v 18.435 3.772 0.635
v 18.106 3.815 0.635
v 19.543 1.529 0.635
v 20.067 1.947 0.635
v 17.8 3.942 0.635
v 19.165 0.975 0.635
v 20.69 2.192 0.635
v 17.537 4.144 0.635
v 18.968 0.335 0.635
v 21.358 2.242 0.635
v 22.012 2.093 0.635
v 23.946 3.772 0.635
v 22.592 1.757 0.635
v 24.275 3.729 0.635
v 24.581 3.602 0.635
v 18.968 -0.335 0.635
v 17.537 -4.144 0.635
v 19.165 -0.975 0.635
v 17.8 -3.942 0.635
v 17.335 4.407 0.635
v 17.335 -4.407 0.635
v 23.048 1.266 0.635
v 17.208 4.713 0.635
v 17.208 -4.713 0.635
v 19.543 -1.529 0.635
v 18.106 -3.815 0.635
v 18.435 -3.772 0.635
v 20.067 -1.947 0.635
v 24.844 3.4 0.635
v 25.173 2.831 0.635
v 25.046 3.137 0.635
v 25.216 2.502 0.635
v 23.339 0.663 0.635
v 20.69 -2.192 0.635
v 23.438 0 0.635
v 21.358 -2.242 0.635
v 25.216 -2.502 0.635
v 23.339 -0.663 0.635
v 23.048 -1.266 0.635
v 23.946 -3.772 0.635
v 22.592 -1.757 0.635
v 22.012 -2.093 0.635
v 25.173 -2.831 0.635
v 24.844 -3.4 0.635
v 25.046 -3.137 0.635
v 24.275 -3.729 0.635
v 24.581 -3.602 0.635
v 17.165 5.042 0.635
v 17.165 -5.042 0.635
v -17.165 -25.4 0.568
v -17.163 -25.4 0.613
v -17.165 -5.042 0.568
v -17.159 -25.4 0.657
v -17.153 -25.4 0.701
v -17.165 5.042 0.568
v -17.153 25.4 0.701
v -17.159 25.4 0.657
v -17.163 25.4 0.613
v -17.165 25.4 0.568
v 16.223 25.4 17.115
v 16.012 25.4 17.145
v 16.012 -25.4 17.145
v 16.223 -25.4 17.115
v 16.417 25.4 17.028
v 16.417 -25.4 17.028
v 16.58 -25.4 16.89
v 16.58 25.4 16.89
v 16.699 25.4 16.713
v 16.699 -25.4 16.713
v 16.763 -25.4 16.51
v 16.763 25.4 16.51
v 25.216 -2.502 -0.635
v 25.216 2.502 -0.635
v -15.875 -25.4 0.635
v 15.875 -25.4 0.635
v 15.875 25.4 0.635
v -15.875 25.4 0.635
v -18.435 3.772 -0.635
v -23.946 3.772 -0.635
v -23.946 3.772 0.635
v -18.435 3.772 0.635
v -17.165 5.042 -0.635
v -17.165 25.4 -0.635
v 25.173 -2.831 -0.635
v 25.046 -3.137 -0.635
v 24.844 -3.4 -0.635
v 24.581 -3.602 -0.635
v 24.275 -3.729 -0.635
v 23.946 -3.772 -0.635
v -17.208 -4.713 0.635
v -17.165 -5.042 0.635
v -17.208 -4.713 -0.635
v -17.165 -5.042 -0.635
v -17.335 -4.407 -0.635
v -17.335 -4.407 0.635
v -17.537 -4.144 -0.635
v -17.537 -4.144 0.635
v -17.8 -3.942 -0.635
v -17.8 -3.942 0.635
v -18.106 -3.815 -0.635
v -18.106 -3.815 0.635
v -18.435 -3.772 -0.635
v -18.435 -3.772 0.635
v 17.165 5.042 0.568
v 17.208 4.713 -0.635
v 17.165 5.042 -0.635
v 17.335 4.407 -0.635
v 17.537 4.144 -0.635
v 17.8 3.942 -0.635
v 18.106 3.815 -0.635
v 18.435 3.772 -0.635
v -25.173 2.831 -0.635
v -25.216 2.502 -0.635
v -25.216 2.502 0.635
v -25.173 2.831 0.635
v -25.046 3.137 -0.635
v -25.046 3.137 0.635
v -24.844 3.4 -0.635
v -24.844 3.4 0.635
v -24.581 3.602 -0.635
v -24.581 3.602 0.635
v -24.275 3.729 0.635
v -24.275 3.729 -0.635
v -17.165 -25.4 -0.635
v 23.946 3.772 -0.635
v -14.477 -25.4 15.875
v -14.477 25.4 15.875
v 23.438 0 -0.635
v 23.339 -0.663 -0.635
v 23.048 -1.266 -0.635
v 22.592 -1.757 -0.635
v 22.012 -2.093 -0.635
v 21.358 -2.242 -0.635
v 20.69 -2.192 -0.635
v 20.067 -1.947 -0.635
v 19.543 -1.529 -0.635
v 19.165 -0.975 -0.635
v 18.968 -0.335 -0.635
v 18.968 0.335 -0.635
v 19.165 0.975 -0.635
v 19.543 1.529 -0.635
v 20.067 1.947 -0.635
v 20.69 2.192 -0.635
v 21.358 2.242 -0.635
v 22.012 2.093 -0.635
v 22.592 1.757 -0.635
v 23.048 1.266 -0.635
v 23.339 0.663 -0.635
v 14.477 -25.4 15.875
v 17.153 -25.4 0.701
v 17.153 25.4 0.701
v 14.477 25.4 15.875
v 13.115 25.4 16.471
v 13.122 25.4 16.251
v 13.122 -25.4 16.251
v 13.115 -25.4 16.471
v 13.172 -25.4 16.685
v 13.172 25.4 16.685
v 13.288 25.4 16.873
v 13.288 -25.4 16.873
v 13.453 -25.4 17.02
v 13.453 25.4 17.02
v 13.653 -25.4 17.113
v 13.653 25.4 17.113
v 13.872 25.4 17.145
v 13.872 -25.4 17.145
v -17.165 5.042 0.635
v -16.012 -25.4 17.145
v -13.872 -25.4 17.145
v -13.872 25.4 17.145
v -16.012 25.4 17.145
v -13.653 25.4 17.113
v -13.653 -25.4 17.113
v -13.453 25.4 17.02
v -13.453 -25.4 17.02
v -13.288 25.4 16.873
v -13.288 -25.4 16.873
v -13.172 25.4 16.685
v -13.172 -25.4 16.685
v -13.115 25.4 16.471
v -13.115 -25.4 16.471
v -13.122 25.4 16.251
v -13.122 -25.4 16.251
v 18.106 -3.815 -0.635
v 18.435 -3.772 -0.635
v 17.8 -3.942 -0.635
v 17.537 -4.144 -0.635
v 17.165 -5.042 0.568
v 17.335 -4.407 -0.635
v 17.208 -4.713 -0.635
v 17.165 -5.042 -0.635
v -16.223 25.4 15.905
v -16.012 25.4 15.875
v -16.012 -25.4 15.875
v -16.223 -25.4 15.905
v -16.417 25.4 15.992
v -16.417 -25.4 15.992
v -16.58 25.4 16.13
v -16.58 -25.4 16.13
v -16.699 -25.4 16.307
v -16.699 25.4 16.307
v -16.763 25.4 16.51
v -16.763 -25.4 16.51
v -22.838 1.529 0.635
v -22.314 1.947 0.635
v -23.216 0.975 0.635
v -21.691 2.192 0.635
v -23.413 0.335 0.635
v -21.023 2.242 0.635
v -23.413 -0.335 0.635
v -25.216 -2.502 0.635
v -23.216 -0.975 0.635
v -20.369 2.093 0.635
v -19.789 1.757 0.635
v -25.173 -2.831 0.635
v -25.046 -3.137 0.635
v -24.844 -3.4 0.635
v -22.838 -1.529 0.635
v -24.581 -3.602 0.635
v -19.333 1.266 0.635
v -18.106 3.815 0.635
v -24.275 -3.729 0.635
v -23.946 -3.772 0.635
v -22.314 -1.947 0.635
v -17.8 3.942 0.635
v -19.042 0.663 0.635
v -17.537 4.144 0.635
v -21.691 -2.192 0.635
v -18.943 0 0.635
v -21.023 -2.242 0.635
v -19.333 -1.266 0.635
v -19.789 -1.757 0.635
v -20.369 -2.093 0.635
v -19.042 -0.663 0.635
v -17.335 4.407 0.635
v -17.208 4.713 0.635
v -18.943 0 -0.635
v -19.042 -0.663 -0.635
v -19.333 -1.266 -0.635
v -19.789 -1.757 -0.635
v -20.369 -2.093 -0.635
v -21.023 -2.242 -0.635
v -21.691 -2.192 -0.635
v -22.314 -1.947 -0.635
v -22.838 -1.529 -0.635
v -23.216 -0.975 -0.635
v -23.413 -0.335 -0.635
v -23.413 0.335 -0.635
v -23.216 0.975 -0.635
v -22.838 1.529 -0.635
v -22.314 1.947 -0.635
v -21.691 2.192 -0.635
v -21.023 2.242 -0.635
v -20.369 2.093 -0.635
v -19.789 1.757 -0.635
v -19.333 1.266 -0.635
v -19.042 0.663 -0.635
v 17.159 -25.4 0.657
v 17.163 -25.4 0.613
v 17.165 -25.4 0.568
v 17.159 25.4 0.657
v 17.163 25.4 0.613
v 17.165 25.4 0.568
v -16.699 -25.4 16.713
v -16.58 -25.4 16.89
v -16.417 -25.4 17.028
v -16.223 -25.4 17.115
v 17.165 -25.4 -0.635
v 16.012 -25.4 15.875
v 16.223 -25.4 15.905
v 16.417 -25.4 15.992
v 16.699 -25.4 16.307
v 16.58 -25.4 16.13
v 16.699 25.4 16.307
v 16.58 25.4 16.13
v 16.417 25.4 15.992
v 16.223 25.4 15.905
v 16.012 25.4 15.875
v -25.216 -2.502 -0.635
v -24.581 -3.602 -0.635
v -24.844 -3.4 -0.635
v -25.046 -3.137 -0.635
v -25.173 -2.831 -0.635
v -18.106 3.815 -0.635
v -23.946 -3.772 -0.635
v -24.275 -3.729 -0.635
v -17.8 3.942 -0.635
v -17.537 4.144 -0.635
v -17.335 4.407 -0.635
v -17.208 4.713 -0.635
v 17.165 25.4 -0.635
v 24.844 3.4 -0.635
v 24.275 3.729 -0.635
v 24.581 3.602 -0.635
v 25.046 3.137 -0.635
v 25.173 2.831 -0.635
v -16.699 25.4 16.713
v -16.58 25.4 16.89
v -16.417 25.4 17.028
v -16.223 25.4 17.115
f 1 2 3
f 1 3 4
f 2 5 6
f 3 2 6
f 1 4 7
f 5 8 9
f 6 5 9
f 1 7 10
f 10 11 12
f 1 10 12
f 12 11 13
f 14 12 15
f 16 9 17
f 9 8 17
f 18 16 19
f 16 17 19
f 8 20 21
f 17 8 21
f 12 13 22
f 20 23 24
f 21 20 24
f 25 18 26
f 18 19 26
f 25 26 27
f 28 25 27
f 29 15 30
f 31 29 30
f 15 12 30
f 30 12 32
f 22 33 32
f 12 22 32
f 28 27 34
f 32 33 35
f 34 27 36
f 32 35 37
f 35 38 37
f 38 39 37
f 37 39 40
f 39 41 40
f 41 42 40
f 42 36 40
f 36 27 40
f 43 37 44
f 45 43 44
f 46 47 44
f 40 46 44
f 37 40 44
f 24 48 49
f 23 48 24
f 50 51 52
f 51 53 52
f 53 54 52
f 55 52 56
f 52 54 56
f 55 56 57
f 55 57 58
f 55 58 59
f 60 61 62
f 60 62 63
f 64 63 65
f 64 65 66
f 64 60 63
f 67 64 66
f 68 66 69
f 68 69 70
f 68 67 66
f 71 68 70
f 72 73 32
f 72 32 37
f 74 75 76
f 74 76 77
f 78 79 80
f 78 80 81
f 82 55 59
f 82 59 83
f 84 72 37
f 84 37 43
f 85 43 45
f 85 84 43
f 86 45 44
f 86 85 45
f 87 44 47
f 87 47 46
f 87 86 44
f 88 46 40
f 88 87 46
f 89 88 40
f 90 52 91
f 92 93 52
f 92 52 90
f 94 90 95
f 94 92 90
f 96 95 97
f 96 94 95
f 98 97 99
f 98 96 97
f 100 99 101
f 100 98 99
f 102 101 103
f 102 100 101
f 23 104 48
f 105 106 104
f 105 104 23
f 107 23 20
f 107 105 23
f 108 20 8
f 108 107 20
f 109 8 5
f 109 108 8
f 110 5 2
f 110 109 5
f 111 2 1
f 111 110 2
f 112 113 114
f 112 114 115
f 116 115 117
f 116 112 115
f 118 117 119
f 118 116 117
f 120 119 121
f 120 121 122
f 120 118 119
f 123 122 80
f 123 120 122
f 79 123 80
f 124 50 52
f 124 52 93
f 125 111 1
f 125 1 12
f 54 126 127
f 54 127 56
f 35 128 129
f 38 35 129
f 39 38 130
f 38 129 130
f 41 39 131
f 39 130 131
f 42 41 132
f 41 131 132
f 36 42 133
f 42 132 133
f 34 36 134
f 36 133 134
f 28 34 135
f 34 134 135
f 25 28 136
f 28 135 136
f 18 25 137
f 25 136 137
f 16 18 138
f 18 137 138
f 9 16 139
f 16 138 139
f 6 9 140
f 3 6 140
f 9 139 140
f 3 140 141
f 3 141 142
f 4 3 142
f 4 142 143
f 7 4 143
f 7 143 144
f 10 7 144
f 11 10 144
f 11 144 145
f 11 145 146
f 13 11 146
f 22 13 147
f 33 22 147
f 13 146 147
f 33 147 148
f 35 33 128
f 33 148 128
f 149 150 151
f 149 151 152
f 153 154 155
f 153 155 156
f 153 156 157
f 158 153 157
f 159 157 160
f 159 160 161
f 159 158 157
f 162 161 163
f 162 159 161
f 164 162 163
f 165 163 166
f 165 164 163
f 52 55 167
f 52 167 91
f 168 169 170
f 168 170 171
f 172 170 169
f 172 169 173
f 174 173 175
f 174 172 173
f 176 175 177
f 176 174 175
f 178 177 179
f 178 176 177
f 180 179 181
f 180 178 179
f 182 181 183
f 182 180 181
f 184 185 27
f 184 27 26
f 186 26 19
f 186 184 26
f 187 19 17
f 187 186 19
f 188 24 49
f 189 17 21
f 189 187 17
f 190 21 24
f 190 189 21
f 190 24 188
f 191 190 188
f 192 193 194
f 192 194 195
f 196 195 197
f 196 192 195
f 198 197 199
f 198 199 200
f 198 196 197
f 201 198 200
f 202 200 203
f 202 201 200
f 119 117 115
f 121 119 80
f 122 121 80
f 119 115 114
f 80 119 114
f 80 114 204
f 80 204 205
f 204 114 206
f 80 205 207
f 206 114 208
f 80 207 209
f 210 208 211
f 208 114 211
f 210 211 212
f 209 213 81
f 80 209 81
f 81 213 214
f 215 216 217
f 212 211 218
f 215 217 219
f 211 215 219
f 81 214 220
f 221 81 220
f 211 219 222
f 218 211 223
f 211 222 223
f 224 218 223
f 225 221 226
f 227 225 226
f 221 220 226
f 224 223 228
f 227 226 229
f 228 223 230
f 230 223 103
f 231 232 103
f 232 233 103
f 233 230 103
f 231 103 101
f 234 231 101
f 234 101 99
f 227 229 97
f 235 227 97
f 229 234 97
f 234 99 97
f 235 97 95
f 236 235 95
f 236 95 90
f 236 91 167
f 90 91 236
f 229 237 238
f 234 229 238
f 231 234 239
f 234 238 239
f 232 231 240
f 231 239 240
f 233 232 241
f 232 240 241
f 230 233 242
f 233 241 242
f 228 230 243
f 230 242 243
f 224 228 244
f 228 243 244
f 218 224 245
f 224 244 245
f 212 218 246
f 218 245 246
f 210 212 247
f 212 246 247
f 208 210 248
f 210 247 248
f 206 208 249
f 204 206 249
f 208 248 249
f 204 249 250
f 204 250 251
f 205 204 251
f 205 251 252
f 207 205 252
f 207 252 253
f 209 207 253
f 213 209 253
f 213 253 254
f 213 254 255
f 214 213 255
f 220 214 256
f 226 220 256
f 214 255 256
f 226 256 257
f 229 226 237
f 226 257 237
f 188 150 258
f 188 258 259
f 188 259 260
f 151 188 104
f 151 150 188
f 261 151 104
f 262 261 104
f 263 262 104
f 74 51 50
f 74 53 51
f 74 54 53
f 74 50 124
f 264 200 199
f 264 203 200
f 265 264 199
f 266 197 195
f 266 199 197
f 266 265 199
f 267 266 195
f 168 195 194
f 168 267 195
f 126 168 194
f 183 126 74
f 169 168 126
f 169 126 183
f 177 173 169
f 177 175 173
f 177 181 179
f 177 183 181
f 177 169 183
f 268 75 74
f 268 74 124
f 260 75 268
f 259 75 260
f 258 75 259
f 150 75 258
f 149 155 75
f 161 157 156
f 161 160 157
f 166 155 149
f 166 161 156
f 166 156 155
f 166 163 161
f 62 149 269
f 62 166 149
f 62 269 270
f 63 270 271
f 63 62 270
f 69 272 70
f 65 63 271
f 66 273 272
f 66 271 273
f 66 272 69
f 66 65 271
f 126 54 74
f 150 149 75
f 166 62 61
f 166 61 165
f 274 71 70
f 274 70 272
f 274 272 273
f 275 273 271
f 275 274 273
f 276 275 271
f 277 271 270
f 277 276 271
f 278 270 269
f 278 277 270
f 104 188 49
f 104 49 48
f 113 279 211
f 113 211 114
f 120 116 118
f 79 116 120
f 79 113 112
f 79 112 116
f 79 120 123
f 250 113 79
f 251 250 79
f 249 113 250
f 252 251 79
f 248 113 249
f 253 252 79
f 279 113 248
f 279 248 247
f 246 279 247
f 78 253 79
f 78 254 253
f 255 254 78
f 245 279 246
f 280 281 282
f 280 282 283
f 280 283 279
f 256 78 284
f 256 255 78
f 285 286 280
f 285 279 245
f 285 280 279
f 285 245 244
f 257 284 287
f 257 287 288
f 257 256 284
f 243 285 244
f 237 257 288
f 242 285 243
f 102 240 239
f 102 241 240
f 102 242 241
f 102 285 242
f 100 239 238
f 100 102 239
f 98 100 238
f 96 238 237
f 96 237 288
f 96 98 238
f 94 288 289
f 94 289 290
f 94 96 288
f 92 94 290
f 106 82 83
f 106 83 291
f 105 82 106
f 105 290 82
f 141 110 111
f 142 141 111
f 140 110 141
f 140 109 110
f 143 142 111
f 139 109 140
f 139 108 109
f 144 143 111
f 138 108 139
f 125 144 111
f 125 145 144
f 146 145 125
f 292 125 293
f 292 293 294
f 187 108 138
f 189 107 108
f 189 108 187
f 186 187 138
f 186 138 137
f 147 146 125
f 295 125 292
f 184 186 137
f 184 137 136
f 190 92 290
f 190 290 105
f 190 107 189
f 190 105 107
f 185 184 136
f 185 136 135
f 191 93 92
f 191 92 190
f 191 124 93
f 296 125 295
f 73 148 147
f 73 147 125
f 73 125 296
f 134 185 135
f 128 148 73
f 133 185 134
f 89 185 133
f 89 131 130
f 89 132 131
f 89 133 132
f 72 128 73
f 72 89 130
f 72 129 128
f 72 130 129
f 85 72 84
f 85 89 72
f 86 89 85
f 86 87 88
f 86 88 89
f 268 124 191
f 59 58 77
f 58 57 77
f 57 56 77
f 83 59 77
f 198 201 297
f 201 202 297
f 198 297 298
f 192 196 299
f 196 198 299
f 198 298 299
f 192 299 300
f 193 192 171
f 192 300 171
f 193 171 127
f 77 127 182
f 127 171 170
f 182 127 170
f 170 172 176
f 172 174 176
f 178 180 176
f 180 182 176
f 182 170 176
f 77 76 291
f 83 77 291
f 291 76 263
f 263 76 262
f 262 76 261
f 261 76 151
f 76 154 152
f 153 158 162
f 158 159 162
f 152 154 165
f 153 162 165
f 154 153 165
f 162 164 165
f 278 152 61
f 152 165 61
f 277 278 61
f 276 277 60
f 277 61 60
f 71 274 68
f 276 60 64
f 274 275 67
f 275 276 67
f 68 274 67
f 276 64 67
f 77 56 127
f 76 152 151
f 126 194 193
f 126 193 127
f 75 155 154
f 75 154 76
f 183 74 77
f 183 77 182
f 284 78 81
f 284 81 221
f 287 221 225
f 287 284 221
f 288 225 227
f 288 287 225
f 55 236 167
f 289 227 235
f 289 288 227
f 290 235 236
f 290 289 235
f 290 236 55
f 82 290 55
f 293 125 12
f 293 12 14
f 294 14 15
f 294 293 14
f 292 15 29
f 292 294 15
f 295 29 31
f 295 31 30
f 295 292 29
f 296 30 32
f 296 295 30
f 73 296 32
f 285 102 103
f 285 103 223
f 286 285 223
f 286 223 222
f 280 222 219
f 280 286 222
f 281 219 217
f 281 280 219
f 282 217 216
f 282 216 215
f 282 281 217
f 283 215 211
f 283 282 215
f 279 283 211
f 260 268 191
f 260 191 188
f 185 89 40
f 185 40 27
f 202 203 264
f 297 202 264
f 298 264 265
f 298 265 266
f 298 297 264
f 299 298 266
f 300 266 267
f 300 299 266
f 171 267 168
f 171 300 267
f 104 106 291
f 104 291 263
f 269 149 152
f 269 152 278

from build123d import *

# Parameters (mm, degrees)
F1_DEPTH    = 25.4
F2_T1_DEPTH = 55.3405811878
F2_T3_DEPTH = 54.61
F2_T5_DEPTH = 51.133331808
F3_R        = 2.2479
F4_DEPTH    = 1.27


# Not quite as in the source:
# - a fillet or chamfer that OpenCascade refuses, or shapes differently, is made with other operations: its cross-section is extruded or revolved along the edge and cut away or added


with BuildPart() as f1:
    # F0 (on Front) → F1 (new body, symmetric)
    with BuildSketch(Plane.XZ):
        Polygon((-14.4773686111, 15.875), (-17.1645917971, 0.635), (-15.875, 0.635), (-12.9638415485, 17.145), (-16.7738415485, 17.145), (-16.7738415485, 15.875), align=None)
        Polygon((-15.875, 0.635), (-17.1645917971, 0.635), (-17.1645917971, -0.635), (17.1645917971, -0.635), (17.1645917971, 0.635), (15.875, 0.635), align=None)
        Polygon((12.9638415485, 17.145), (15.875, 0.635), (17.1645917971, 0.635), (14.4773686111, 15.875), (16.7738415485, 15.875), (16.7738415485, 17.145), align=None)
    extrude(amount=F1_DEPTH, both=True)

    # F2: fillet of radius 0.762 on 8 edges, made by hand

    # F2_s2 → F2_t1 (cut)
    with BuildSketch(Plane.XZ.offset(-27.6702905939)):
        with BuildLine():
            ThreePointArc((-13.8719577861, 17.145), (-13.2882319204, 16.8728041586), (-13.1215342783, 16.2506800886))
            Line((-13.1215342783, 16.2506800886), (-12.9638415485, 17.145))
            Line((-12.9638415485, 17.145), (-13.8719577861, 17.145))
        make_face()
        with BuildLine():
            ThreePointArc((13.1215342783, 16.2506800886), (13.2882319204, 16.8728041586), (13.8719577861, 17.145))
            Line((13.8719577861, 17.145), (12.9638415485, 17.145))
            Line((12.9638415485, 17.145), (13.1215342783, 16.2506800886))
        make_face()
    extrude(amount=F2_T1_DEPTH, mode=Mode.SUBTRACT)

    # F2_s4 → F2_t3 (cut)
    with BuildSketch(Plane.XZ.offset(-27.305)):
        with BuildLine():
            ThreePointArc((-16.7738415485, 16.383), (-16.5506569158, 16.9218153673), (-16.0118415485, 17.145))
            Line((-16.0118415485, 17.145), (-16.7738415485, 17.145))
            Line((-16.7738415485, 17.145), (-16.7738415485, 16.383))
        make_face()
        with BuildLine():
            ThreePointArc((16.0118415485, 17.145), (16.5506569158, 16.9218153673), (16.7738415485, 16.383))
            Line((16.7738415485, 16.383), (16.7738415485, 17.145))
            Line((16.7738415485, 17.145), (16.0118415485, 17.145))
        make_face()
        with BuildLine():
            ThreePointArc((-16.0118415485, 15.875), (-16.5506569158, 16.0981846327), (-16.7738415485, 16.637))
            Line((-16.7738415485, 16.637), (-16.7738415485, 15.875))
            Line((-16.7738415485, 15.875), (-16.0118415485, 15.875))
        make_face()
        with BuildLine():
            ThreePointArc((16.7738415485, 16.637), (16.5506569158, 16.0981846327), (16.0118415485, 15.875))
            Line((16.0118415485, 15.875), (16.7738415485, 15.875))
            Line((16.7738415485, 15.875), (16.7738415485, 16.637))
        make_face()
    extrude(amount=F2_T3_DEPTH, mode=Mode.SUBTRACT)

    # F2_s6 → F2_t5 (cut)
    with BuildSketch(Plane.XZ.offset(-25.566665904)):
        with BuildLine():
            ThreePointArc((-17.1530153049, 0.7006535498), (-17.161692157, 0.6347463144), (-17.1645917971, 0.5683336384))
            Line((-17.1645917971, 0.5683336384), (-17.1645917971, 0.635))
            Line((-17.1645917971, 0.635), (-17.1530153049, 0.7006535498))
        make_face()
        with BuildLine():
            ThreePointArc((17.1530153049, 0.7006535498), (17.161692157, 0.6347463144), (17.1645917971, 0.5683336384))
            Line((17.1645917971, 0.5683336384), (17.1645917971, 0.635))
            Line((17.1645917971, 0.635), (17.1530153049, 0.7006535498))
        make_face()
    extrude(amount=F2_T5_DEPTH, mode=Mode.SUBTRACT)

    # F3 (on face) → F4 (join)
    with BuildSketch(Plane(origin=(0, 0, -0.635), x_dir=(1, 0, 0), z_dir=(0, 0, -1))):
        with BuildLine():
            Line((-17.1645917971, 3.7719), (-17.1645917971, 5.0419))
            ThreePointArc((-17.1645917971, 5.0419), (-17.536566185, 4.1438743879), (-18.4345917971, 3.7719))
            Line((-18.4345917971, 3.7719), (-23.9463917971, 3.7719))
            ThreePointArc((-23.9463917971, 3.7719), (-24.8444174092, 3.3999256121), (-25.2163917971, 2.5019))
            Line((-25.2163917971, 2.5019), (-25.2163917971, -2.5019))
            ThreePointArc((-25.2163917971, -2.5019), (-24.8444174092, -3.3999256121), (-23.9463917971, -3.7719))
            Line((-23.9463917971, -3.7719), (-18.4345917971, -3.7719))
            ThreePointArc((-18.4345917971, -3.7719), (-17.536566185, -4.1438743879), (-17.1645917971, -5.0419))
            Line((-17.1645917971, -5.0419), (-17.1645917971, -3.7719))
            Line((-17.1645917971, -3.7719), (-17.1645917971, 3.7719))
        make_face()
        with Locations((-21.1904917971, 0)):
            Circle(F3_R, mode=Mode.SUBTRACT)
        with BuildLine():
            Line((23.9463917971, 3.7719), (18.4345917971, 3.7719))
            ThreePointArc((18.4345917971, 3.7719), (17.536566185, 4.1438743879), (17.1645917971, 5.0419))
            Line((17.1645917971, 5.0419), (17.1645917971, 3.7719))
            Line((17.1645917971, 3.7719), (17.1645917971, -3.7719))
            Line((17.1645917971, -3.7719), (17.1645917971, -5.0419))
            ThreePointArc((17.1645917971, -5.0419), (17.536566185, -4.1438743879), (18.4345917971, -3.7719))
            Line((18.4345917971, -3.7719), (23.9463917971, -3.7719))
            ThreePointArc((23.9463917971, -3.7719), (24.8444174092, -3.3999256121), (25.2163917971, -2.5019))
            Line((25.2163917971, -2.5019), (25.2163917971, 2.5019))
            ThreePointArc((25.2163917971, 2.5019), (24.8444174092, 3.3999256121), (23.9463917971, 3.7719))
        make_face()
        with Locations((21.1904917971, 0)):
            Circle(F3_R, mode=Mode.SUBTRACT)
    extrude(amount=-F4_DEPTH)


solid = f1.part
